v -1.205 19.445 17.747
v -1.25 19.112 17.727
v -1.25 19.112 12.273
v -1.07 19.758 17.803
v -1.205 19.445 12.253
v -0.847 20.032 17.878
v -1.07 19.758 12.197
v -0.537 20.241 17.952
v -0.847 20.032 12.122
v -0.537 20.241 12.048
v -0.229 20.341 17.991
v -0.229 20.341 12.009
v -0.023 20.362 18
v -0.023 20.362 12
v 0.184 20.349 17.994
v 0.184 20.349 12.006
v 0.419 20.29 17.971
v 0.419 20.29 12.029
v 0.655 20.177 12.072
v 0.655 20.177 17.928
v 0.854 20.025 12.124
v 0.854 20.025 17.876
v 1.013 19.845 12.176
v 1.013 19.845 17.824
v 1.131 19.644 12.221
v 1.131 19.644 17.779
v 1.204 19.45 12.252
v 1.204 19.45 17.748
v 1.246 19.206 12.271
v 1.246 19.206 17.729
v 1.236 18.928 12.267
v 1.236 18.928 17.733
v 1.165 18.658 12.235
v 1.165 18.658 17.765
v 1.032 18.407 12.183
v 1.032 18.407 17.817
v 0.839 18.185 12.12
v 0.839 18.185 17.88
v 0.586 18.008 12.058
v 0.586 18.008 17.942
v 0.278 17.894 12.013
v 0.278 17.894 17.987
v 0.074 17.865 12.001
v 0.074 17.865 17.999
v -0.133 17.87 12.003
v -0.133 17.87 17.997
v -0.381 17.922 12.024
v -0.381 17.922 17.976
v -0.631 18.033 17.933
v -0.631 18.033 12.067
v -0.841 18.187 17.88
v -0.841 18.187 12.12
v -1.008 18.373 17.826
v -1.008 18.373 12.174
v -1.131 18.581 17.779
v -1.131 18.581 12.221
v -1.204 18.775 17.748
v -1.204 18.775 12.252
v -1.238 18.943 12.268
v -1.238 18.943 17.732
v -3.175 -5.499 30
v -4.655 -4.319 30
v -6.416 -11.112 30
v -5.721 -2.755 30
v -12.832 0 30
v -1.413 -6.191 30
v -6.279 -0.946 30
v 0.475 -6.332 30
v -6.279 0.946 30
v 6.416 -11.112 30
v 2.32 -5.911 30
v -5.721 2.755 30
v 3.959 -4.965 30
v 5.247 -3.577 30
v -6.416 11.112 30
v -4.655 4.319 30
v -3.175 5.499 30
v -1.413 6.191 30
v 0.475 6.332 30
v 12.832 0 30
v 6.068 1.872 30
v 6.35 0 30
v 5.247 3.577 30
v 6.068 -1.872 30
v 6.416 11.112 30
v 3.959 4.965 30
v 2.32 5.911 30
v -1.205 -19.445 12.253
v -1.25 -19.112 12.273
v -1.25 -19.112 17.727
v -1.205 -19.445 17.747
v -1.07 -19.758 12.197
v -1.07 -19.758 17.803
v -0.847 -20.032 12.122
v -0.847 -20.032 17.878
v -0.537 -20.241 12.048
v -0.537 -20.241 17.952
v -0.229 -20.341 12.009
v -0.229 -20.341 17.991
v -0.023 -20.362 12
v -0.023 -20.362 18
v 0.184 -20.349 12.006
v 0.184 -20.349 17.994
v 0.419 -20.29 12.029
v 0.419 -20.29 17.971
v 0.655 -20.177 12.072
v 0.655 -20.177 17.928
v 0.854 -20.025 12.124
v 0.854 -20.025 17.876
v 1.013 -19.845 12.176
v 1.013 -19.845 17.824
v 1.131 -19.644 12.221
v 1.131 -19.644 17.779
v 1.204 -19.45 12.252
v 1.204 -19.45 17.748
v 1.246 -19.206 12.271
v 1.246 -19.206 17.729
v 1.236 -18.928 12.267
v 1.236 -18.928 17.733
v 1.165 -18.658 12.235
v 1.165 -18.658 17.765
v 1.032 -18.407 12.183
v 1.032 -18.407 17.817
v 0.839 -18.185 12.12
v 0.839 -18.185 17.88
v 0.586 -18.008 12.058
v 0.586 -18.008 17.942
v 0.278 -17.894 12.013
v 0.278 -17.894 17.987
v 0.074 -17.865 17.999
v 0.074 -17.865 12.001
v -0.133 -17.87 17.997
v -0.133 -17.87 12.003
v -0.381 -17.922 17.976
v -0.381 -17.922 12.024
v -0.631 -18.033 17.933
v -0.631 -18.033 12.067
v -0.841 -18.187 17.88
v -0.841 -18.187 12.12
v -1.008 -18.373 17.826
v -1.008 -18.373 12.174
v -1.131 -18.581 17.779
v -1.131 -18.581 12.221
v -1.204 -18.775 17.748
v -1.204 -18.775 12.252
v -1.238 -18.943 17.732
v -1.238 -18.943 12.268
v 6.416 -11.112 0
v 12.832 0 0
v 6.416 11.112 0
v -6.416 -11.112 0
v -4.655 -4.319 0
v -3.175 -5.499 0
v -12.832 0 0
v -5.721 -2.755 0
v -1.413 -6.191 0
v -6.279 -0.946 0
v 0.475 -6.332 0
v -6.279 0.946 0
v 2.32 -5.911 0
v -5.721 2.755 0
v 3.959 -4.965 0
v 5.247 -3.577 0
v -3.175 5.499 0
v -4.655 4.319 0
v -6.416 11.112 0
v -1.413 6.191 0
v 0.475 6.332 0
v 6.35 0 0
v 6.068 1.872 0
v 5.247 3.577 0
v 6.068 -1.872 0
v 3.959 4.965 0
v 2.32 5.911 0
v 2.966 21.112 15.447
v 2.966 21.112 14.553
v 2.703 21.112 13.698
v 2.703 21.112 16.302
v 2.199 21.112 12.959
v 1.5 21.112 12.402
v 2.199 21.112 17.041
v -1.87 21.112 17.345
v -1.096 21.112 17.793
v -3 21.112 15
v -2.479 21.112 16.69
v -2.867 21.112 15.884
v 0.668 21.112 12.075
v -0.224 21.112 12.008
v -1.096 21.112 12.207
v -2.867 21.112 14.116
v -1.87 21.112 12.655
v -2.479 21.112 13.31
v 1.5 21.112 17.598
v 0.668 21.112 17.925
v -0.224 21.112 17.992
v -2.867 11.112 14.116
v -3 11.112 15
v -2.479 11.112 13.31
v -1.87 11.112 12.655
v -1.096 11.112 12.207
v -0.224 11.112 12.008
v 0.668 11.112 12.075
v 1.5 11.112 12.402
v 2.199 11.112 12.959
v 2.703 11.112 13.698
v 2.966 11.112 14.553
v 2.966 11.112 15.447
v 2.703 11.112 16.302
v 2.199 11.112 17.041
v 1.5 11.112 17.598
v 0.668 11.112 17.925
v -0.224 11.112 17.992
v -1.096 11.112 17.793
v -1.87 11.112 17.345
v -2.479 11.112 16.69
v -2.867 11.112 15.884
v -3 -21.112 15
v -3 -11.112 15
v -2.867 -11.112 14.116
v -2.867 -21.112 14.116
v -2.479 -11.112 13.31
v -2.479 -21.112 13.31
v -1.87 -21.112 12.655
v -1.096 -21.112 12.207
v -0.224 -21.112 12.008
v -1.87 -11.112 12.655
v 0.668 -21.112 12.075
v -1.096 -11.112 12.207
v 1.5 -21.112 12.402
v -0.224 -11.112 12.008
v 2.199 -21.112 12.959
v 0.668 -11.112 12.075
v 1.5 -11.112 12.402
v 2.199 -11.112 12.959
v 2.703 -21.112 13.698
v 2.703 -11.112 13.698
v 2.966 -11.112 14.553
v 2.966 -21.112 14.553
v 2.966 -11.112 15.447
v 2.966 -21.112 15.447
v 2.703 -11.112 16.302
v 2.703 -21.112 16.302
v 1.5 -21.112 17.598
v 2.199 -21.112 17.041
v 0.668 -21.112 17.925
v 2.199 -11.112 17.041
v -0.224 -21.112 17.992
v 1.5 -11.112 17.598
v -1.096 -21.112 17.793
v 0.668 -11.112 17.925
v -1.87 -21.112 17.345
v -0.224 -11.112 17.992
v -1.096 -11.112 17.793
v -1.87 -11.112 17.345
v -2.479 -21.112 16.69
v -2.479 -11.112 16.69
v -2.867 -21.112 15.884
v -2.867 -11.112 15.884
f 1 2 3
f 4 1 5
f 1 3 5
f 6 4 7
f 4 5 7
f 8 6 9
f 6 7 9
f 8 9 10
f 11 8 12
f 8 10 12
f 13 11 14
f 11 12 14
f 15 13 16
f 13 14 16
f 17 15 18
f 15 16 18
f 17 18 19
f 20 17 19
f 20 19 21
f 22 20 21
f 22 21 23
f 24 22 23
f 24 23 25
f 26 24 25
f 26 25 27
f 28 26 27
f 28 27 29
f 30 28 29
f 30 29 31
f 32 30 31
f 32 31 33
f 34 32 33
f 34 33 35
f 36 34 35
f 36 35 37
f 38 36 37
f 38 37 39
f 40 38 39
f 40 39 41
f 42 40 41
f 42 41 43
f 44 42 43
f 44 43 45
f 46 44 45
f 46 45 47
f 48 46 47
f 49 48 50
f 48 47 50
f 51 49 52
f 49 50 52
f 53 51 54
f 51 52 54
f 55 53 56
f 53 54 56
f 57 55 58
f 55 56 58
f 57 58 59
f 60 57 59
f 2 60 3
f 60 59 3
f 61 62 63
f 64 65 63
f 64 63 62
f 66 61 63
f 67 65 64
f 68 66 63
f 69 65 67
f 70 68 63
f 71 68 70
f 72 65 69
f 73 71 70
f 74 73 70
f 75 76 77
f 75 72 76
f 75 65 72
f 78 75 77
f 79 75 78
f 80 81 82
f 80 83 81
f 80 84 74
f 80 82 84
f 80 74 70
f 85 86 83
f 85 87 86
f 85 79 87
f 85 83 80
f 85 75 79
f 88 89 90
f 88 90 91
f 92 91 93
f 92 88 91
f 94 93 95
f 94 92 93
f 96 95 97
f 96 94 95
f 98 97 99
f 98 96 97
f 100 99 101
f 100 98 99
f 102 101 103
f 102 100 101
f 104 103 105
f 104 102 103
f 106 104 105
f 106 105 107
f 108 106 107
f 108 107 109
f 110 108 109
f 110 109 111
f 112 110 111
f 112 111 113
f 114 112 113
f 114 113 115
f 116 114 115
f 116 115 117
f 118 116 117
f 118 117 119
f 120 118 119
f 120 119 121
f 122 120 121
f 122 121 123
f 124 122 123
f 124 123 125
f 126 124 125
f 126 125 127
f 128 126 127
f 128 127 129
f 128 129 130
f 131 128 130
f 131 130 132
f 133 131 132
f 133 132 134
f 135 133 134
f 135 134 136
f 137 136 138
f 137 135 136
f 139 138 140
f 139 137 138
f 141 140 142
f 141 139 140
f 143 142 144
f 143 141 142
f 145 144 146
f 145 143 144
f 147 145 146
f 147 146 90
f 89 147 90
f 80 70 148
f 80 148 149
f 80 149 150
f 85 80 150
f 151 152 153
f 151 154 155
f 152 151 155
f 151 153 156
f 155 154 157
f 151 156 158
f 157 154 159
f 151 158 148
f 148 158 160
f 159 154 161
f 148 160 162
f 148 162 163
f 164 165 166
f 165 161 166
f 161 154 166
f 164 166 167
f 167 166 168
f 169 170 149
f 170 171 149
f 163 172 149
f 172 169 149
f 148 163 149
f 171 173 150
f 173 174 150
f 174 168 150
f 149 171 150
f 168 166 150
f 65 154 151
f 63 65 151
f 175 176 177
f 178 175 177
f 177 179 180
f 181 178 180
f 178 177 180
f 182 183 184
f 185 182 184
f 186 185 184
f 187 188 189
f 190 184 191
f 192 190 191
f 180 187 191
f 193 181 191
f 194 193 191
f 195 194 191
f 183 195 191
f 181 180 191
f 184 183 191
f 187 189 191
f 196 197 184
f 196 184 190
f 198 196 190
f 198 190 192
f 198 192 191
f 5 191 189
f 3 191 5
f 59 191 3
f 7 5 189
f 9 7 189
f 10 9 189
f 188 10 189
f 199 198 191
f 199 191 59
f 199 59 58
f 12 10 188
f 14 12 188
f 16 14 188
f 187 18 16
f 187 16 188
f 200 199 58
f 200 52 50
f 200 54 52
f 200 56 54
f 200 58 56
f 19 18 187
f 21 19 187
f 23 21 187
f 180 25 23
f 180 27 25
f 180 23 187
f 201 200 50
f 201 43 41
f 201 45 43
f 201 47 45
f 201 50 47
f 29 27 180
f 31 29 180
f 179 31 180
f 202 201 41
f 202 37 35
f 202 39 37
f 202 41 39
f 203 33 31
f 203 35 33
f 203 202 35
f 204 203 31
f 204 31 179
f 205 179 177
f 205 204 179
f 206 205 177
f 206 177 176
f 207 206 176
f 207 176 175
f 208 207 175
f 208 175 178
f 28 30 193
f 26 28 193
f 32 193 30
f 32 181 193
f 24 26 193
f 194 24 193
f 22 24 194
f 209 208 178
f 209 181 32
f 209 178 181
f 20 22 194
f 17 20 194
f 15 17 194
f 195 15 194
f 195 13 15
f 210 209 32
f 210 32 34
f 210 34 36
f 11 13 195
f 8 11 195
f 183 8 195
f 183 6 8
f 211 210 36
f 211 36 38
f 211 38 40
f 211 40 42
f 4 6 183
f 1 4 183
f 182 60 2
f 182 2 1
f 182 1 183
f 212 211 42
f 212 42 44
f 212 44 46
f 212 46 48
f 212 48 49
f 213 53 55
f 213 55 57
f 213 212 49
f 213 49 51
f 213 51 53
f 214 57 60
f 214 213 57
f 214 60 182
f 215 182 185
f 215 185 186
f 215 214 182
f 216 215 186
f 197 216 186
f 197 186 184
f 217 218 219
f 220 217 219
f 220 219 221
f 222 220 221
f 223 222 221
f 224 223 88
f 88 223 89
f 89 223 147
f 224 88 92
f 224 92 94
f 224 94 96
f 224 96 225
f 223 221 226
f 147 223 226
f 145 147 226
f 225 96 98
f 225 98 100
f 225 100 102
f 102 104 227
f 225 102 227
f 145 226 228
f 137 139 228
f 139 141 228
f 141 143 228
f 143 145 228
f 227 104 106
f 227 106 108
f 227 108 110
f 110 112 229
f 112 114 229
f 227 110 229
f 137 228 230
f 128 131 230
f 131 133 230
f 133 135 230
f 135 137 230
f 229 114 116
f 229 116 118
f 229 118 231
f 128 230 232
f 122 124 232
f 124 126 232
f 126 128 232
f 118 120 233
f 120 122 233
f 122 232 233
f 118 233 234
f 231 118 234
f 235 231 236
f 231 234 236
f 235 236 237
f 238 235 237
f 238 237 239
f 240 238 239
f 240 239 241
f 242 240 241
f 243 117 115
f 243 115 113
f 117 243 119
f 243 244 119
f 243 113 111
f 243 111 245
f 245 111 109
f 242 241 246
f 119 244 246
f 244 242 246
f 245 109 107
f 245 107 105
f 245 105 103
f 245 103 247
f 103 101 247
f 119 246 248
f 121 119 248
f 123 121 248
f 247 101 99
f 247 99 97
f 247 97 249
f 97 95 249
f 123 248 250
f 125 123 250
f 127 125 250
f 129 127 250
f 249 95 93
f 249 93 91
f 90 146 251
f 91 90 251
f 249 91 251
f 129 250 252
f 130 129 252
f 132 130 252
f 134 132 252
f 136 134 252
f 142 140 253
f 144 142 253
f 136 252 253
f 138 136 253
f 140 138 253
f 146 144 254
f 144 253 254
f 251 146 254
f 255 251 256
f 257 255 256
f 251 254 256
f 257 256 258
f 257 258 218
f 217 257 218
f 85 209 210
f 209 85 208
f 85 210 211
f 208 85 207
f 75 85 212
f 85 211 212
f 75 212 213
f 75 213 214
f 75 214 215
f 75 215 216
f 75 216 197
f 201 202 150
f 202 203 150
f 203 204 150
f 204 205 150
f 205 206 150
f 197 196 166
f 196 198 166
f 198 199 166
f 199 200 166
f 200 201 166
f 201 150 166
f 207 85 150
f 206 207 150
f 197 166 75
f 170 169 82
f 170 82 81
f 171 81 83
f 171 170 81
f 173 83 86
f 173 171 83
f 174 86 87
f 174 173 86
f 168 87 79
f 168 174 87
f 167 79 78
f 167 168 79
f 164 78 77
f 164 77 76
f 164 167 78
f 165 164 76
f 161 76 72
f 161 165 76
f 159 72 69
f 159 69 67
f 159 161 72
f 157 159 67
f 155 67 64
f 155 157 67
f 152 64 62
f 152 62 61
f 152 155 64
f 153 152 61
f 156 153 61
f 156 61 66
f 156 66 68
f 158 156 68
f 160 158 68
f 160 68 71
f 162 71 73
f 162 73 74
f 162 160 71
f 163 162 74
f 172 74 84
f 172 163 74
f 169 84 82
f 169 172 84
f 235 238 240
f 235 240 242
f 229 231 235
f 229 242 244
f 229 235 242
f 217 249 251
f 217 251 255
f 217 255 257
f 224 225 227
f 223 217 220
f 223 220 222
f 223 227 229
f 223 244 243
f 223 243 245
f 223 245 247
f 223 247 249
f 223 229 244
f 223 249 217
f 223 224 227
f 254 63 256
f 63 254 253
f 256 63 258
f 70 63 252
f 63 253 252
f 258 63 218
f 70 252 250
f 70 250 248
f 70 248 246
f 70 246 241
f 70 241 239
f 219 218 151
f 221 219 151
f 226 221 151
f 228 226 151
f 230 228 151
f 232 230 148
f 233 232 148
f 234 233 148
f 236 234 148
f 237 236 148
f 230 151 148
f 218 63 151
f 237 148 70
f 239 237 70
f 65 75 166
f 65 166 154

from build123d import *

# Parameters (mm, degrees)
SKETCH1_R           = 6.35
BOSS_EXTRUDE1_DEPTH = 30
SKETCH2_R           = 3
BOSS_EXTRUDE2_DEPTH = 10
SKETCH3_R           = 1.25
CUT_EXTRUDE1_DEPTH  = 39.863708837


with BuildPart() as part:
    # Sketch1 → Boss-Extrude1 (new body)
    with BuildSketch(Plane.XY):
        Polygon((6.415804866, -11.1125), (12.831609733, 0), (6.415804866, 11.1125), (-6.415804866, 11.1125), (-12.831609733, 0), (-6.415804866, -11.1125), align=None)
        Circle(SKETCH1_R, mode=Mode.SUBTRACT)
    extrude(amount=BOSS_EXTRUDE1_DEPTH)

    # Sketch2 → Boss-Extrude2 (add)
    with BuildSketch(Plane.XZ.offset(11.1125)):
        with Locations(Location((0, 15, 0), (0, 0, 180))):
            Circle(SKETCH2_R)
    boss_extrude2 = extrude(amount=BOSS_EXTRUDE2_DEPTH)

    # Sketch3 → Cut-Extrude1 (cut, through all)
    with BuildSketch(Plane.XY):
        with Locations(Location((0, -19.1125, 0), (0, 0, 180))):
            Circle(SKETCH3_R)
    cut_extrude1 = extrude(amount=CUT_EXTRUDE1_DEPTH, mode=Mode.SUBTRACT)

    # Mirror1: Boss-Extrude2, Cut-Extrude1 across plane
    add(boss_extrude2.mirror(Plane.ZX))
    add(cut_extrude1.mirror(Plane.ZX), mode=Mode.SUBTRACT)


solid = part.part
